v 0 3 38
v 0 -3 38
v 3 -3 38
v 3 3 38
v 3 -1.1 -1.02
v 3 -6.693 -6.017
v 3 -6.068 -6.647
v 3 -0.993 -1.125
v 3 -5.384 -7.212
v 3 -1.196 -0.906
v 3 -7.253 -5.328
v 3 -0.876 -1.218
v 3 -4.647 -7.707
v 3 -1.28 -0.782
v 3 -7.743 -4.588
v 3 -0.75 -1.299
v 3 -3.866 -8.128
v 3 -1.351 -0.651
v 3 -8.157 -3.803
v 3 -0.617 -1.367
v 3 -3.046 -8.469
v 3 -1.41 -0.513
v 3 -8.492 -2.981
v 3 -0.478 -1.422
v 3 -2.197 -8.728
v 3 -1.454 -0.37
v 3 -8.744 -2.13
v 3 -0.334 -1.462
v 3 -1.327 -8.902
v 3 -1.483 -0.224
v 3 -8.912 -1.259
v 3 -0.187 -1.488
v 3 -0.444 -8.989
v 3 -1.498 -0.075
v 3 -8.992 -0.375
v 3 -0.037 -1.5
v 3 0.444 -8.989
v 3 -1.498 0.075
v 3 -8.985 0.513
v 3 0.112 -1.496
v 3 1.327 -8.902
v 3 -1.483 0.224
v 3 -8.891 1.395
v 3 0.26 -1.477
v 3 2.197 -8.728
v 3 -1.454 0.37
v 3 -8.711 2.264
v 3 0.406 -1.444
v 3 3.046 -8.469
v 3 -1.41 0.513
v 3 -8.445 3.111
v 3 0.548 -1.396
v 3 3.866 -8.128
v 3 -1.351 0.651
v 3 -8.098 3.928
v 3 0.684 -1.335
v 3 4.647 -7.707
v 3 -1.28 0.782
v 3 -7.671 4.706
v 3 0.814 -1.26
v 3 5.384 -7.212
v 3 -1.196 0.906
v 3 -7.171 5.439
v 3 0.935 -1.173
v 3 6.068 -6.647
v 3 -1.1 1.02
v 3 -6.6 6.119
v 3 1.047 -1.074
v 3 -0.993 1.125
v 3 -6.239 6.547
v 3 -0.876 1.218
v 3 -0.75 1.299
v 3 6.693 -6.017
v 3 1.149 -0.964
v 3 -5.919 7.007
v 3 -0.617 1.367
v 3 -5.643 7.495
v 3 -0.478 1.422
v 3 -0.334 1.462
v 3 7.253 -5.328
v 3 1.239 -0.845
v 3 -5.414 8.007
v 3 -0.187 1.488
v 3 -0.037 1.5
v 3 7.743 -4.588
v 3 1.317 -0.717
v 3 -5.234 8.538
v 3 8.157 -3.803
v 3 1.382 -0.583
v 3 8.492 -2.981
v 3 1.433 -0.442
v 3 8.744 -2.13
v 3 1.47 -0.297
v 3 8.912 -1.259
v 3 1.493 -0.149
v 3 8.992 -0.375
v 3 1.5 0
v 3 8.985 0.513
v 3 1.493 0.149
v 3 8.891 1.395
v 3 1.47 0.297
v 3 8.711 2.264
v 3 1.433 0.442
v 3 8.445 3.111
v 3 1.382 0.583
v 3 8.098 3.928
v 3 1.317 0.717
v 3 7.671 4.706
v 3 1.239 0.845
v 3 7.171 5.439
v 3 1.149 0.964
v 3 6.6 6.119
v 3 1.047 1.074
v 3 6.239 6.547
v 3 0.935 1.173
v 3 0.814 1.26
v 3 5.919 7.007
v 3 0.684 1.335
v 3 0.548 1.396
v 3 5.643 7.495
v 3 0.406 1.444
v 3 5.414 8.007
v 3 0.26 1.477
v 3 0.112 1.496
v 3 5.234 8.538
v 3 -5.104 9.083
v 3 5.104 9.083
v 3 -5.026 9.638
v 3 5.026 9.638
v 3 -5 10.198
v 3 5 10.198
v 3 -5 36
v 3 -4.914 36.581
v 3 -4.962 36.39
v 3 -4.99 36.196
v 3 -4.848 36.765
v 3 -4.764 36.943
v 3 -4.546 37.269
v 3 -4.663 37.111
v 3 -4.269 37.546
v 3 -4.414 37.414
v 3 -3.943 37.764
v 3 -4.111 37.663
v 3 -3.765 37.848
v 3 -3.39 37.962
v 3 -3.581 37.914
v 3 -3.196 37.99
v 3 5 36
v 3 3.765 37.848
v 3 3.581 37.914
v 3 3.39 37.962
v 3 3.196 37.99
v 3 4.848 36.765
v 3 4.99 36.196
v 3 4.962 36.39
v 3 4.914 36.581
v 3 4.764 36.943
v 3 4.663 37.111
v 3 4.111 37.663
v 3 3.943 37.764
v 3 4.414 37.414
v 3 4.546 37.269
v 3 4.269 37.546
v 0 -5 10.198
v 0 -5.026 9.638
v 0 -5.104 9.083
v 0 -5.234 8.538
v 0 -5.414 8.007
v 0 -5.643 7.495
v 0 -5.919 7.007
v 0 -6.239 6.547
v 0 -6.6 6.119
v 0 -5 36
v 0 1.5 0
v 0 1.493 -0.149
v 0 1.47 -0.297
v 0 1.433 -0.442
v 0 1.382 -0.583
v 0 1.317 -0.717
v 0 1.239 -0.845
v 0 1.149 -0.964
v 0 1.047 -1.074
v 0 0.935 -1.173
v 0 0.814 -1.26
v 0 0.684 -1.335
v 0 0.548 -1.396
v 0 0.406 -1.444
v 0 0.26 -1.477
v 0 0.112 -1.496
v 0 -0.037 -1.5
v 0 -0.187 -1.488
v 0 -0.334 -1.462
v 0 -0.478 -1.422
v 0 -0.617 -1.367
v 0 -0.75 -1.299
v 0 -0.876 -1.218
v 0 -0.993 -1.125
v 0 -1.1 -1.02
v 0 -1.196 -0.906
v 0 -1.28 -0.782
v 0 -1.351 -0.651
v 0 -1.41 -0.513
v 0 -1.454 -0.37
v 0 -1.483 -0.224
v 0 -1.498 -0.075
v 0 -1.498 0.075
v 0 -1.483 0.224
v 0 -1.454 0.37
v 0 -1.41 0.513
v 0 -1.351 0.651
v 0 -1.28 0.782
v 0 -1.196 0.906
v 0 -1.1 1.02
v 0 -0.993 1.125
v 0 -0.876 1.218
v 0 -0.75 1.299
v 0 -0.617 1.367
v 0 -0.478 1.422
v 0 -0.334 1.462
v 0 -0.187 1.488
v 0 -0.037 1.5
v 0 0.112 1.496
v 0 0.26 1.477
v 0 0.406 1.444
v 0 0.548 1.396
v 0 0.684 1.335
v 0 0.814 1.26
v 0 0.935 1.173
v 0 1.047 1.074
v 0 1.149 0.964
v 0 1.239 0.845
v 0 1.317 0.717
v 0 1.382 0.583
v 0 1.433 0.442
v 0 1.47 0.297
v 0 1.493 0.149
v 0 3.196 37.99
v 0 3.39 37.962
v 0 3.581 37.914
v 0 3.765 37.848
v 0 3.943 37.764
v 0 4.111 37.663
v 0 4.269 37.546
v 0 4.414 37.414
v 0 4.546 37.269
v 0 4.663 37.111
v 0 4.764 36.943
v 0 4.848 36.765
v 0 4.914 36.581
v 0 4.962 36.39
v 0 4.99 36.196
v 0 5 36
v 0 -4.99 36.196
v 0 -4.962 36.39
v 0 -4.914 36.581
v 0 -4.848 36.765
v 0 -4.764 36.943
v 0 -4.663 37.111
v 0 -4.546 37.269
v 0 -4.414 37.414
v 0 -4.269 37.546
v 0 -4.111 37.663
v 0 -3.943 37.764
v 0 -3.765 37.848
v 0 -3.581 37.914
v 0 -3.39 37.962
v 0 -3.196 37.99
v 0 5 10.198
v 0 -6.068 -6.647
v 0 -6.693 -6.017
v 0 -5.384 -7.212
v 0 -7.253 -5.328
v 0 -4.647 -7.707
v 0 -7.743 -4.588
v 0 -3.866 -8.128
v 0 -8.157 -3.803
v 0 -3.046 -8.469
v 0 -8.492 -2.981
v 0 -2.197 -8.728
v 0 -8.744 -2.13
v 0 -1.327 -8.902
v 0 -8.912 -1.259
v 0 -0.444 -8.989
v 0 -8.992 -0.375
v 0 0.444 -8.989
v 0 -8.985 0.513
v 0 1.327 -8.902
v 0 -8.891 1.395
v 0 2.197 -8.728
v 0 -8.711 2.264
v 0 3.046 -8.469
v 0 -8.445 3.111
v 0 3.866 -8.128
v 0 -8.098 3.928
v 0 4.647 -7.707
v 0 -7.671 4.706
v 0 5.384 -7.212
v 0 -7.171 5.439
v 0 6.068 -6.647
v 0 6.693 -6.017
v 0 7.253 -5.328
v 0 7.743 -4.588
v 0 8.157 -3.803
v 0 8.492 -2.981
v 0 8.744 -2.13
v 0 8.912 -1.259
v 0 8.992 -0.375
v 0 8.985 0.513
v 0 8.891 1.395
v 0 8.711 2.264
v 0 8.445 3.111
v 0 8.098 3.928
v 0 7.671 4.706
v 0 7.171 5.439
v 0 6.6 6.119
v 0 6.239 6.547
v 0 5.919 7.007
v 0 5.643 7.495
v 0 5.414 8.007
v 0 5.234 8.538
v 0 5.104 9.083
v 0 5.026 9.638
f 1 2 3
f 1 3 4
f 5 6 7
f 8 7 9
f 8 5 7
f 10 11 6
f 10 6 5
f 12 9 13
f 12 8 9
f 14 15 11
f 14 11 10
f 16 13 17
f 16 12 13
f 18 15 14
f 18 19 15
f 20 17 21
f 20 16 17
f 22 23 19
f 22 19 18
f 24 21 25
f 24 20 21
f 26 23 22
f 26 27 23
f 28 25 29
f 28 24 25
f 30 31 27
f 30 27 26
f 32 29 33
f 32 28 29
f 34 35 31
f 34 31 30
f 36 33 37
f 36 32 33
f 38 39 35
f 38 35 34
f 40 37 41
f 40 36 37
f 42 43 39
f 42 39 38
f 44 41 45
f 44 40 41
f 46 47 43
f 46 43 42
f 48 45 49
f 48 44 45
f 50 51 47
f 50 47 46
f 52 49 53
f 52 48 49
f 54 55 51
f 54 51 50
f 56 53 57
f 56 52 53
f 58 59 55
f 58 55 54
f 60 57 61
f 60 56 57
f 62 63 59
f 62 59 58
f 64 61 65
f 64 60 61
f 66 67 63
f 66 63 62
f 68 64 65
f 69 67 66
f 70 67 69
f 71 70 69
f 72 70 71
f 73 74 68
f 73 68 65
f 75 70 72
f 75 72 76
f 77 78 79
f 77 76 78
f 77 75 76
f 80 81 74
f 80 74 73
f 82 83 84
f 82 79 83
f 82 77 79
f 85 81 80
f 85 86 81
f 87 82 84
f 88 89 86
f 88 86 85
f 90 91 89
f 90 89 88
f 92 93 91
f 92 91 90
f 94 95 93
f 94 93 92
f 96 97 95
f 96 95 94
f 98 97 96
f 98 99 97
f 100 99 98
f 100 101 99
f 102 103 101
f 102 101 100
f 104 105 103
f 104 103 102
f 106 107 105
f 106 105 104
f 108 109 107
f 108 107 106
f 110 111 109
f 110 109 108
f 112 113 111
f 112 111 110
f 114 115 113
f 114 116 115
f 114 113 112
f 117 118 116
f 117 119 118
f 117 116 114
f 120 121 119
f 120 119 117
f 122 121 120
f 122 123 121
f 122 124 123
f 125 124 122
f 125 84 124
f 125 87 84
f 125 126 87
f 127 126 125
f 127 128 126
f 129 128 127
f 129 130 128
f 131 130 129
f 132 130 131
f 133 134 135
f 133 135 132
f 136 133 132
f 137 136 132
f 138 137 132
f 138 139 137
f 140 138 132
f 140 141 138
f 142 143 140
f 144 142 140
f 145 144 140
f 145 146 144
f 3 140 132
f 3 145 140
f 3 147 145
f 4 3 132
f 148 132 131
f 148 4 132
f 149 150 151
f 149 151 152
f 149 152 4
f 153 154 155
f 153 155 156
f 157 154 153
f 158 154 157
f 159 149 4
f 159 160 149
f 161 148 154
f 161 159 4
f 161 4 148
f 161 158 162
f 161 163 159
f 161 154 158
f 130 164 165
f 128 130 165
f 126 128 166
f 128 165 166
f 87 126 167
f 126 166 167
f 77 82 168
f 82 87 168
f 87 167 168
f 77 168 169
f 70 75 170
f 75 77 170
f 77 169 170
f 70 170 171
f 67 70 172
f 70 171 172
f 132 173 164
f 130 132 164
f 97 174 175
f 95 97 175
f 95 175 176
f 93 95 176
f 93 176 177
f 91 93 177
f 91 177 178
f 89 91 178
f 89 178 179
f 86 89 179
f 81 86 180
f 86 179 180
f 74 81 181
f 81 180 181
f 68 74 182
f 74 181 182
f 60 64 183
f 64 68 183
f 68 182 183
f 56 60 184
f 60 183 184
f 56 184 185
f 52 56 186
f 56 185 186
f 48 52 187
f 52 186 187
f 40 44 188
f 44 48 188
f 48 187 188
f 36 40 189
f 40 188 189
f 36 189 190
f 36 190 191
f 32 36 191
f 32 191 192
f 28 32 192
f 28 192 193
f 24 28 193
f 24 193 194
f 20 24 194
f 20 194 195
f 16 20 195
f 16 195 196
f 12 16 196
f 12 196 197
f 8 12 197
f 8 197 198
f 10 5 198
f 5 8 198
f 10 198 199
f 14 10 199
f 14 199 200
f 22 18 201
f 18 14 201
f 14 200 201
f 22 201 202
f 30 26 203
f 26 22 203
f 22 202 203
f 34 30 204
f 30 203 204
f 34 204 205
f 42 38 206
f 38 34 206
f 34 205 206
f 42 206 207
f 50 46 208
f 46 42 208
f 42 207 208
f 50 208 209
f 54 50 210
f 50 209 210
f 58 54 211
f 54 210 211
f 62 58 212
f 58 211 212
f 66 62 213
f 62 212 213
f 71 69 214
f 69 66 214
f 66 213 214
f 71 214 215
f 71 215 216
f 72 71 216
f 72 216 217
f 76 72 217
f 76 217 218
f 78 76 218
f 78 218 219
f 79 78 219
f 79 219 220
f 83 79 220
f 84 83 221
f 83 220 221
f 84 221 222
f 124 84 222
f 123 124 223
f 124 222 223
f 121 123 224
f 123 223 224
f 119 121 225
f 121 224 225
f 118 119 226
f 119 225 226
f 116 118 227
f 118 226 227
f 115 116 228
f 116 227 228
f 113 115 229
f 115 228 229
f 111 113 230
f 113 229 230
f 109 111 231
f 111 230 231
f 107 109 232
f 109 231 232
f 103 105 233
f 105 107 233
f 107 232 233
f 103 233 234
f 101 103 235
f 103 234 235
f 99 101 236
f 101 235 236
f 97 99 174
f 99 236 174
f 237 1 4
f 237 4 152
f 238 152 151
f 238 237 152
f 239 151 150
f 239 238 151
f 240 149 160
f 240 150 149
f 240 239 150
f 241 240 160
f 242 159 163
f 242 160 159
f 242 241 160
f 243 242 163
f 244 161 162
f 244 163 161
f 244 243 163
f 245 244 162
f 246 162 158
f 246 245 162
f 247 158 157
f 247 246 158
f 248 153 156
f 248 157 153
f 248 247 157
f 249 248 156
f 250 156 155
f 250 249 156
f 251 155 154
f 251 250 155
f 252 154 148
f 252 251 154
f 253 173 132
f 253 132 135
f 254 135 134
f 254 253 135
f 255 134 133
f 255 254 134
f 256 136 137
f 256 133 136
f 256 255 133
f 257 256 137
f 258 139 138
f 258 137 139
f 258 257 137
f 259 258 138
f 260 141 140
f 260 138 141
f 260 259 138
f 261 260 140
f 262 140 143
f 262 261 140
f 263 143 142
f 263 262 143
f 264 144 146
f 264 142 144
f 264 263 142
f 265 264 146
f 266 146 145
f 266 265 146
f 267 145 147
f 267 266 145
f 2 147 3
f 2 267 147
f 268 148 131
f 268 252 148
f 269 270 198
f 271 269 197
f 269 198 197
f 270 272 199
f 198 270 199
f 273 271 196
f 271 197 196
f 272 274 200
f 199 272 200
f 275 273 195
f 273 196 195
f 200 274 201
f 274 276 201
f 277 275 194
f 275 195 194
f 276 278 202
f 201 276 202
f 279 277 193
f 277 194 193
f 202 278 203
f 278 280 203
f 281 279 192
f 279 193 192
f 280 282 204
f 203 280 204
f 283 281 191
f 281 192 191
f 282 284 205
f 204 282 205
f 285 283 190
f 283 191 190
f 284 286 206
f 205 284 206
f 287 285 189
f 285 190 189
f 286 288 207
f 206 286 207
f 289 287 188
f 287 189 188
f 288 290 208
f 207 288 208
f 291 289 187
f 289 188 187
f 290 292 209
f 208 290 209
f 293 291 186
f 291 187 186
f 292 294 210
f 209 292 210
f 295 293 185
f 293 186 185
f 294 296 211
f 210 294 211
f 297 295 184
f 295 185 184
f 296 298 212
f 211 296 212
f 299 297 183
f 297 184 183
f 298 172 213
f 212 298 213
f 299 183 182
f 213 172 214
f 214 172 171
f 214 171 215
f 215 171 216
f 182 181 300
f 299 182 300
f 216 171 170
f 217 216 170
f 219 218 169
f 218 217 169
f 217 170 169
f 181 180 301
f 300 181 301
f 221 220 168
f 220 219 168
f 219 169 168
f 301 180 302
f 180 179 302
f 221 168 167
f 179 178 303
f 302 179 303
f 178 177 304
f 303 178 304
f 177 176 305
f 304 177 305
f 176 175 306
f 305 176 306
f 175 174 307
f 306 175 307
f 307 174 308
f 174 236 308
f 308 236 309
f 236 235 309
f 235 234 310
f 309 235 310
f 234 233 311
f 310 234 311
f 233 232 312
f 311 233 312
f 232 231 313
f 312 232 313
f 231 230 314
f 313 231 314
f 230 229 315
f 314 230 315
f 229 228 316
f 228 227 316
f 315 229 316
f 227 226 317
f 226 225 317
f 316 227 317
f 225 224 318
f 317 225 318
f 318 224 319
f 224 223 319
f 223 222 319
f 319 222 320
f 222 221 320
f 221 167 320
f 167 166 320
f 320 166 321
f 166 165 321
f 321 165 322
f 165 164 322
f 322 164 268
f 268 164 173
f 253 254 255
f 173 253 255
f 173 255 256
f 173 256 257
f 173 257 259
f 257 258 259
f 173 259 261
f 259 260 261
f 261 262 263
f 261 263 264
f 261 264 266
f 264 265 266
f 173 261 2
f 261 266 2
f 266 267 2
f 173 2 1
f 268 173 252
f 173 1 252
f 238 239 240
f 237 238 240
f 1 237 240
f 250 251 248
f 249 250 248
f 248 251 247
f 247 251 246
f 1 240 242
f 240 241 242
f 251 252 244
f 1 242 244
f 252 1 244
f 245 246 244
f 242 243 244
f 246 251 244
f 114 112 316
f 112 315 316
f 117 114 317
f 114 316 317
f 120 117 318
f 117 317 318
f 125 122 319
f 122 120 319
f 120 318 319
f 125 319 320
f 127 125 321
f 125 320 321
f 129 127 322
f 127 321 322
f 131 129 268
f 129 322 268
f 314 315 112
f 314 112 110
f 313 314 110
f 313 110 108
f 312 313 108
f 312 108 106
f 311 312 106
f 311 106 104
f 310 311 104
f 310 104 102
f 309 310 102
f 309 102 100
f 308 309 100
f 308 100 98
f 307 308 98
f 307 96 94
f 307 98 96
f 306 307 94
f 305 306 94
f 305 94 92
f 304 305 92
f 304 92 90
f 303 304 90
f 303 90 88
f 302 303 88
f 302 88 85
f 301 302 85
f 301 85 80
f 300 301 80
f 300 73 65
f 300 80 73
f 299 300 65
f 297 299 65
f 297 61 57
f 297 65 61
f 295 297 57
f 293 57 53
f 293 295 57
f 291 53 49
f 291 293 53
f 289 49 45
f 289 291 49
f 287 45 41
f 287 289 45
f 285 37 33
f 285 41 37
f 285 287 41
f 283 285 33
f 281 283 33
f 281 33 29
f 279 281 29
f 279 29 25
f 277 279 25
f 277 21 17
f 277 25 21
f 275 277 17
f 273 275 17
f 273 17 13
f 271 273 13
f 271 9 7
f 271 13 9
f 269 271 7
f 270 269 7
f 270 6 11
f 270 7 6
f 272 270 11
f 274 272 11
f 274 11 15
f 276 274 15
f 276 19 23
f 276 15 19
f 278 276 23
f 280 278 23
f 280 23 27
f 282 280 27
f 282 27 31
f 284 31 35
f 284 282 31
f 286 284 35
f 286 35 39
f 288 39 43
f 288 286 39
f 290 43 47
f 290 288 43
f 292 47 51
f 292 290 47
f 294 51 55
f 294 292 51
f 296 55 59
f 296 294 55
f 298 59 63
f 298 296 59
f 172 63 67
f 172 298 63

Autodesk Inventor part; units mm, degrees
ref_plane "YZ Plane" through (0, 0, 0) normal (1, 0, 0) x (0, 1, 0)
ref_plane "XZ Plane" through (0, 0, 0) normal (0, 1, 0) x (-1, 0, 0)
ref_plane "XY Plane" through (0, 0, 0) normal (0, 0, 1) x (1, 0, 0)
sketch "Sketch1" plane through (0, 0, 0) normal (1, 0, 0) x (0, 1, 0)
  line L0 (-21, 41) -> (21, 41) construction
  line L1 (-5, 36) -> (-5, 10.198)
  line L2 (5, 36) -> (5, 10.198)
  arc A0 (-6.6, 6.1188) -> (6.6, 6.1188) centre (0, 0) ccw
  arc A1 (-6.6, 6.1188) -> (-5, 10.198) centre (-11, 10.198) ccw
  arc A2 (5, 10.198) -> (6.6, 6.1188) centre (11, 10.198) ccw
  arc A3 (-5, 45.7275) -> (5.2222, 45.7026) centre (0, 0) ccw construction
  circle A4 centre (0, 0) radius 1.5
  line L3 (-3, 38) -> (3, 38)
  arc A5 (-3, 38) -> (-5, 36) centre (-3, 36) ccw
  arc A6 (5, 36) -> (3, 38) centre (3, 36) ccw
  point P0 (-5, 38)
  point P1 (5, 38)
  point P2 (-5, 7.4833)
  point P3 (5, 7.4833)
  dimension "d25" = 10
  dimension "d69" = 6
  dimension "d101" = 3
  dimension "d108" = 9
  dimension "d109" = 38
  dimension "d110" = 5
  dimension "d111" = 2
extrude "Extrusion6" add sketch "Sketch1" along normal blind 3
properties part number "Camera Mount_A073113"
